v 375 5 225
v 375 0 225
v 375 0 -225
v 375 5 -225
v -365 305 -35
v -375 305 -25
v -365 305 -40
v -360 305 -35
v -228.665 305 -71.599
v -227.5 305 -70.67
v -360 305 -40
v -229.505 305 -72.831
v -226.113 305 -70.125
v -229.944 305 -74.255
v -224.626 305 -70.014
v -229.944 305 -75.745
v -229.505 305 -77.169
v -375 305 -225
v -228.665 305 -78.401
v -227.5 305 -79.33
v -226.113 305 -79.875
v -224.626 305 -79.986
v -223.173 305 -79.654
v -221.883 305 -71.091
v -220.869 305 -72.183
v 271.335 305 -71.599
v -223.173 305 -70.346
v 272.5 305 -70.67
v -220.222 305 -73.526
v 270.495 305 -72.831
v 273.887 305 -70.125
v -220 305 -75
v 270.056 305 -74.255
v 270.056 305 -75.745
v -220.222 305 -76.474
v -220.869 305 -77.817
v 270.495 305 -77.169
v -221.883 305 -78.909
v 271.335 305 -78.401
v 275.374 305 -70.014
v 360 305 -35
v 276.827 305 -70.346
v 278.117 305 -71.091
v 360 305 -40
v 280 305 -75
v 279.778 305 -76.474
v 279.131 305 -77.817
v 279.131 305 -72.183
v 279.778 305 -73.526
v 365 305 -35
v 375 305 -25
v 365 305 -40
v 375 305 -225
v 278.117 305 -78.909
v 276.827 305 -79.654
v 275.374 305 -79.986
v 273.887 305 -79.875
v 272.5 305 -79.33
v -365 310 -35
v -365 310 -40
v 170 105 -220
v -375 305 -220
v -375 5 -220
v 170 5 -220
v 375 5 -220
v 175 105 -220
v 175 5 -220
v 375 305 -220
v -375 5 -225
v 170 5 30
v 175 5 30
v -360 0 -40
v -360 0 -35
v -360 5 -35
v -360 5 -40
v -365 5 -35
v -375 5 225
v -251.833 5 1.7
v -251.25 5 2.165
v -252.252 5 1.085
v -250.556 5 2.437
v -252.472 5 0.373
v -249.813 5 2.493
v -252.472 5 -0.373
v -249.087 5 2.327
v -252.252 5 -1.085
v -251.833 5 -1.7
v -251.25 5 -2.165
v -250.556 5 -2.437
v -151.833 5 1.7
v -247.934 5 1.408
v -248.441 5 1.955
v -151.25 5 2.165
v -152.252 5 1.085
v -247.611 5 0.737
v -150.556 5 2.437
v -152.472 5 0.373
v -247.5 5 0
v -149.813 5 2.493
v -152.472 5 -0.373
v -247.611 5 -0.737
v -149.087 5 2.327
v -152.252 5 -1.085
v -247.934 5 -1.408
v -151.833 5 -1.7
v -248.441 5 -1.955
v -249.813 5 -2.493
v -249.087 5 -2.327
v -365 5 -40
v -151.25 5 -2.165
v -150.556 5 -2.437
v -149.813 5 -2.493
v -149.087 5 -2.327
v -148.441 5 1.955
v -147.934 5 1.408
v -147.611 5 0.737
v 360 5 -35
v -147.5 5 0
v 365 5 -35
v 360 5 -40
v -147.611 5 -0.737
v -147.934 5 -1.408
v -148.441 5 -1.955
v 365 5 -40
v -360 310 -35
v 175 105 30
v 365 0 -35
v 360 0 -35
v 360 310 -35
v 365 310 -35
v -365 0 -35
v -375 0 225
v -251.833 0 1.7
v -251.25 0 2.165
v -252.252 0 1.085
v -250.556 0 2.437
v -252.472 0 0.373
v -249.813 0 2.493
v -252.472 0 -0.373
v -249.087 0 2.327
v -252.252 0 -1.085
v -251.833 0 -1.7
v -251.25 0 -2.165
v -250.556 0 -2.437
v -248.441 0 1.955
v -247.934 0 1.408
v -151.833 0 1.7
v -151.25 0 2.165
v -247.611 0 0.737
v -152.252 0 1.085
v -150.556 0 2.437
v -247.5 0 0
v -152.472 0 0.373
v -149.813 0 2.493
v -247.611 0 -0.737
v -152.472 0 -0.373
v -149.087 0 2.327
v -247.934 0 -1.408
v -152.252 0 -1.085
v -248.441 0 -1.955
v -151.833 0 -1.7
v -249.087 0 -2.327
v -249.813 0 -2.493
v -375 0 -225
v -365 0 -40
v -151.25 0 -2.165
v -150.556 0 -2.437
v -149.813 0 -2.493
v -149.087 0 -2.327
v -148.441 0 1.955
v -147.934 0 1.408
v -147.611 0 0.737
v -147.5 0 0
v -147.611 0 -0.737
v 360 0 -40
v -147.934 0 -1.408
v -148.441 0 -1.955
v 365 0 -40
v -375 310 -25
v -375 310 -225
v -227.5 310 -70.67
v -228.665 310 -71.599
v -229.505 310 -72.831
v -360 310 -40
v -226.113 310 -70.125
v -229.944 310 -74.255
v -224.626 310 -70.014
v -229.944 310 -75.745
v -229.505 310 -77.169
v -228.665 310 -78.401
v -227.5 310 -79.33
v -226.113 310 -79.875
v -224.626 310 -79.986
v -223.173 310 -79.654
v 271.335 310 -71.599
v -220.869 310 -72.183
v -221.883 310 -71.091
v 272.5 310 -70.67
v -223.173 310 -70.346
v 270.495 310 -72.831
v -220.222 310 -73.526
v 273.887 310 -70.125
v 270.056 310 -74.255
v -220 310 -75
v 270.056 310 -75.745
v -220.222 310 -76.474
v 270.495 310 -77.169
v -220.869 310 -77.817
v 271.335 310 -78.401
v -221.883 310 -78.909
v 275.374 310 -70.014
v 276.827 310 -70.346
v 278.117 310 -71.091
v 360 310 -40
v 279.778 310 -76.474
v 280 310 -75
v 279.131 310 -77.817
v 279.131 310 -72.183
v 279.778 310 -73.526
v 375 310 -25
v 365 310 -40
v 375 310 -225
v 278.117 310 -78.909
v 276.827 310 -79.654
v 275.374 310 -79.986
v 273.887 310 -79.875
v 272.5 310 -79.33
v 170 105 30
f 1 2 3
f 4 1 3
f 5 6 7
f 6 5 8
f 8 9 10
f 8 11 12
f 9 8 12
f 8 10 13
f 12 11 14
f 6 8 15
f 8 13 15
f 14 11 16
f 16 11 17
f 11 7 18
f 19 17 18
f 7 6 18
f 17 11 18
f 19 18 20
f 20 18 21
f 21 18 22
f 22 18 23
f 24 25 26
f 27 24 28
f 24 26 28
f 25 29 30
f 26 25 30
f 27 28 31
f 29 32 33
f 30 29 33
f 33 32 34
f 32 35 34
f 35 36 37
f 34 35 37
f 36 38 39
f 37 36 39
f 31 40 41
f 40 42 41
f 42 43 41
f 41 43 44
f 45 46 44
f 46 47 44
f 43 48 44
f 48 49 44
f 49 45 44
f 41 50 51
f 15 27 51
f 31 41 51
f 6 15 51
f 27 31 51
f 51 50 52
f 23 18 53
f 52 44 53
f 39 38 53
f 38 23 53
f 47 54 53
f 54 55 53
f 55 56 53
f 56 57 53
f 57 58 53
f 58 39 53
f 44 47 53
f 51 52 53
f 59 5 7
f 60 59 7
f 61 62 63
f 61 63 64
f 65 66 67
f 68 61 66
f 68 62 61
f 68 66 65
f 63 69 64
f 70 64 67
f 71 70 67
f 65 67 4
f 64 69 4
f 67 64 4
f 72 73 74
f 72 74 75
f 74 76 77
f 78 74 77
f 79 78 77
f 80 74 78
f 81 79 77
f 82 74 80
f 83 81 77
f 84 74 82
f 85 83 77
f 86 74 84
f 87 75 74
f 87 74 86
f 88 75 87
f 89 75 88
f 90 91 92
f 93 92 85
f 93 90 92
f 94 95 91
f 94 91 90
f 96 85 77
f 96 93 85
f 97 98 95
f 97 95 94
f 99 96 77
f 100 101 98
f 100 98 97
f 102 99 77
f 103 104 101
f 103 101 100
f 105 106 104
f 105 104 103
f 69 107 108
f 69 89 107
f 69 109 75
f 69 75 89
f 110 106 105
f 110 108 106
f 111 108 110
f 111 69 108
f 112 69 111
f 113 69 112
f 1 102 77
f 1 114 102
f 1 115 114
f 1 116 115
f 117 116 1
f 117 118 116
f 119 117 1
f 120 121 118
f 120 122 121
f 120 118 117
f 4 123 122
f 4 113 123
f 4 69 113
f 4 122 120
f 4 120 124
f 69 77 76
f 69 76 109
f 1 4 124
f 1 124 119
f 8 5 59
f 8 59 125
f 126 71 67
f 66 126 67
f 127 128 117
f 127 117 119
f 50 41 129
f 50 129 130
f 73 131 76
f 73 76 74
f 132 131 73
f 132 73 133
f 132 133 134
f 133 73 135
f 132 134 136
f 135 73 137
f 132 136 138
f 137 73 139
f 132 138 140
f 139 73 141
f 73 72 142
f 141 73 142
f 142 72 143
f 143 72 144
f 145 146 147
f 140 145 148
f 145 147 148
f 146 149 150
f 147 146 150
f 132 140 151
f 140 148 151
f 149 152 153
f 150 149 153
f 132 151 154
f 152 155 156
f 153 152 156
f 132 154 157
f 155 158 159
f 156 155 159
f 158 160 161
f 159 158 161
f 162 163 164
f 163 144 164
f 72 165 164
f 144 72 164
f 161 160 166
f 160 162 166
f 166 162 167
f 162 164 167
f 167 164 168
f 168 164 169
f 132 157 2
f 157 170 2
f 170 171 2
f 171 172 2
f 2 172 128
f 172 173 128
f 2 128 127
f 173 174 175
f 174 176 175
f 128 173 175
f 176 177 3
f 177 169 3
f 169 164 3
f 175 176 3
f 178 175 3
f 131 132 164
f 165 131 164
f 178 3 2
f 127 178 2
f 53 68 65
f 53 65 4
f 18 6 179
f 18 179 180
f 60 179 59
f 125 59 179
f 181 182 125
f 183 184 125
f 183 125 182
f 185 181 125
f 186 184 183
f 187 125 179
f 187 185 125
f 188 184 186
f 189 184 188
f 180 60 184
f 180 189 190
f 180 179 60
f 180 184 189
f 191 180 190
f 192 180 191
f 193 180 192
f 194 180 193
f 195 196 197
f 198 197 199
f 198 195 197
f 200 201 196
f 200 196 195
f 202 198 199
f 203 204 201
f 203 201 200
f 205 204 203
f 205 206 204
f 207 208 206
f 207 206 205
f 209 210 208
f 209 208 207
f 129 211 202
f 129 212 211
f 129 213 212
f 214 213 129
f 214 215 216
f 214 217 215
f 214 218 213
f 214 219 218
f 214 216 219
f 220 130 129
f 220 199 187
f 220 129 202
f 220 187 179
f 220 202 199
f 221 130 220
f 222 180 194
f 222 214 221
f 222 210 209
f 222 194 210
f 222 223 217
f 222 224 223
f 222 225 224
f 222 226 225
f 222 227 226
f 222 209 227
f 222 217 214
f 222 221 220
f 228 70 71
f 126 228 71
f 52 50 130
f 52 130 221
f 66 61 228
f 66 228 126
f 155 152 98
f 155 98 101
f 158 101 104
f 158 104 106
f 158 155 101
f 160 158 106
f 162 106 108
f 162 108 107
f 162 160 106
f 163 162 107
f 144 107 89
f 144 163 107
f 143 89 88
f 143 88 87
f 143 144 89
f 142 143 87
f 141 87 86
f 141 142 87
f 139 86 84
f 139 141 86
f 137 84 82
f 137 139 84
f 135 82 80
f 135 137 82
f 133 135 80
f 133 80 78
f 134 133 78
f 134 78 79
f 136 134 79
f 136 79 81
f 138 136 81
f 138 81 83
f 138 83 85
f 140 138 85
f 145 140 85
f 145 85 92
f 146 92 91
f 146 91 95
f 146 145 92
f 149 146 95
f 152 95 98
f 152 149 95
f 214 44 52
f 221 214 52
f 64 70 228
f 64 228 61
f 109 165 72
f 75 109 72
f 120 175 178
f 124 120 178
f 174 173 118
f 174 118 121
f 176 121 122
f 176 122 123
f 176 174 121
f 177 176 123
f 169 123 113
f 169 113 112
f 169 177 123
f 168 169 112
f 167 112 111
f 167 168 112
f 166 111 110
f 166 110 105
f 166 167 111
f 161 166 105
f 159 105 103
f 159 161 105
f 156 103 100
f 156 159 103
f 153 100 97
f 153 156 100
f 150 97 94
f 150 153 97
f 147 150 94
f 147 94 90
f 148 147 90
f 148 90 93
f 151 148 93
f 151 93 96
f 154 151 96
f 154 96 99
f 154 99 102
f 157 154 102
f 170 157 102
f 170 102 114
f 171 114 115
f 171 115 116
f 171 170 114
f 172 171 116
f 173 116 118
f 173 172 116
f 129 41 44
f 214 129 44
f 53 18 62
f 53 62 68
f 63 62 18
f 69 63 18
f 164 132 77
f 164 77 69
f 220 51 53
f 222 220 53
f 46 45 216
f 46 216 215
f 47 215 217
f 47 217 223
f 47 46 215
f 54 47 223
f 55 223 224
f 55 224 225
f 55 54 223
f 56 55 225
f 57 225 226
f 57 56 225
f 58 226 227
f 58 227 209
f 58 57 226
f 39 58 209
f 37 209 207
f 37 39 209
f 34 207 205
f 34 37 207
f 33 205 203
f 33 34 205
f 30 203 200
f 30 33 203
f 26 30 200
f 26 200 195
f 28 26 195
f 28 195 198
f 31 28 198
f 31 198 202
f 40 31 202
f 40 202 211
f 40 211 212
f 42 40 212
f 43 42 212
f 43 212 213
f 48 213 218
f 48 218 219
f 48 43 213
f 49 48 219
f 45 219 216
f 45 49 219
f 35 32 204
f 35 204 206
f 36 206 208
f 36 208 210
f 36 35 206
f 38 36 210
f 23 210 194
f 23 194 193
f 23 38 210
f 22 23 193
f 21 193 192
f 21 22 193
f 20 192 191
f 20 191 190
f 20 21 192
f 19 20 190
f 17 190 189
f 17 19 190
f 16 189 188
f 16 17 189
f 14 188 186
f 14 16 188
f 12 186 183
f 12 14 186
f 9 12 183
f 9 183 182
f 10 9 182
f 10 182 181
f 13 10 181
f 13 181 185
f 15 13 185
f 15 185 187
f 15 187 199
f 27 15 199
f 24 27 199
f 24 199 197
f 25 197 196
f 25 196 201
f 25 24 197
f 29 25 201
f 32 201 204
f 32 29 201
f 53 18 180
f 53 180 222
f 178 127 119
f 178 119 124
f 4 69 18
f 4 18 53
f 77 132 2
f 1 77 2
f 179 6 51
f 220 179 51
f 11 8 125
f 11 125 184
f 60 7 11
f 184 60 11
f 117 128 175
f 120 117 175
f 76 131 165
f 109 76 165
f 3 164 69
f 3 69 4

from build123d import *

# Parameters (mm, degrees)
SKETCH1_W               = 750
SKETCH1_H               = 450
BOSS_EXTRUDE1_DEPTH     = 310
SKETCH8_W               = 750
SKETCH8_H               = 300
CUT_EXTRUDE1_DEPTH      = 445
SKETCH15_W              = 5
SKETCH15_H              = 250
BOSS_EXTRUDE8_DEPTH     = 100
CUT_EXTRUDE2_DEPTH      = 537.050370768
CUT_EXTRUDE2_DEPTH_BACK = 10
SKETCH16_R              = 5
SKETCH16_W              = 750
SKETCH16_H              = 250
SKETCH18_W              = 5
SKETCH18_H              = 5
CUT_EXTRUDE3_DEPTH      = 537.050370768
SKETCH10_R              = 2.5
CUT_EXTRUDE4_DEPTH      = 534.174455502
SPLIT1_START            = 305
SPLIT1_OUTLINE_W        = 750
SPLIT1_OUTLINE_H        = 200
SPLIT1_OUTLINE_W_2      = 5
SPLIT1_OUTLINE_H_2      = 5
SPLIT1_OUTLINE_R        = 5
SPLIT1_DEPTH            = 5
SPLIT1_2_OUTLINE_W      = 750
SPLIT1_2_OUTLINE_H      = 450
SPLIT1_2_OUTLINE_W_2    = 5
SPLIT1_2_OUTLINE_H_2    = 5
SPLIT1_2_OUTLINE_R      = 2.5
SPLIT1_2_DEPTH          = 5
SPLIT1_3_OUTLINE_W      = 750
SPLIT1_3_OUTLINE_H      = 200
SPLIT1_3_OUTLINE_W_2    = 5
SPLIT1_3_OUTLINE_H_2    = 5
SPLIT1_3_OUTLINE_R      = 5
SPLIT1_3_DEPTH          = 5
SPLIT1_4_OUTLINE_W      = 750
SPLIT1_4_OUTLINE_H      = 450
SPLIT1_4_OUTLINE_W_2    = 5
SPLIT1_4_OUTLINE_H_2    = 5
SPLIT1_4_OUTLINE_R      = 2.5
SPLIT1_4_DEPTH          = 5


# Read off the part's stored shape, not the designer's step: Split1
with BuildPart() as part:
    # Sketch1 → Boss-Extrude1 (new body)
    with BuildSketch(Plane(origin=(0, 0, 0), x_dir=(1, 0, 0), z_dir=(0, 1, 0))):
        Rectangle(SKETCH1_W, SKETCH1_H)
    extrude(amount=BOSS_EXTRUDE1_DEPTH)

    # Sketch8 → Cut-Extrude1 (cut)
    with BuildSketch(Plane.XY.offset(225)):
        with Locations((0, 155)):
            Rectangle(SKETCH8_W, SKETCH8_H)
    extrude(amount=-CUT_EXTRUDE1_DEPTH, mode=Mode.SUBTRACT)

    # Sketch15 → Boss-Extrude8 (add)
    with BuildSketch(Plane(origin=(0, 5, 0), x_dir=(1, 0, 0), z_dir=(0, 1, 0))):
        with Locations((172.5, 95)):
            Rectangle(SKETCH15_W, SKETCH15_H)
    extrude(amount=BOSS_EXTRUDE8_DEPTH)

    # Sketch16 → Cut-Extrude2 (cut, two sides: drawn at the far end of the back side and taken through both)
    with BuildSketch(Plane(origin=(0, 310, 0), x_dir=(1, 0, 0), z_dir=(0, 1, 0)).offset(-CUT_EXTRUDE2_DEPTH_BACK)):
        with Locations(Location((275, 75, 0), (0, 0, 90))):
            Circle(SKETCH16_R)
        with Locations(Location((-225, 75, 0), (0, 0, 90))):
            Circle(SKETCH16_R)
        with Locations((0, -100)):
            Rectangle(SKETCH16_W, SKETCH16_H)
    extrude(amount=CUT_EXTRUDE2_DEPTH + CUT_EXTRUDE2_DEPTH_BACK, mode=Mode.SUBTRACT)

    # Sketch18 → Cut-Extrude3 (cut, through all)
    with BuildSketch(Plane(origin=(0, 310, 0), x_dir=(1, 0, 0), z_dir=(0, 1, 0))):
        with Locations((-362.5, 37.5)):
            Rectangle(SKETCH18_W, SKETCH18_H)
        with Locations((362.5, 37.5)):
            Rectangle(SKETCH18_W, SKETCH18_H)
    extrude(amount=-CUT_EXTRUDE3_DEPTH, mode=Mode.SUBTRACT)

    # Sketch10 → Cut-Extrude4 (cut, through all)
    with BuildSketch(Plane(origin=(0, 5, 0), x_dir=(1, 0, 0), z_dir=(0, 1, 0))):
        with Locations(Location((-250, 0, 0), (0, 0, 270))):
            Circle(SKETCH10_R)
        with Locations(Location((-150, 0, 0), (0, 0, 270))):
            Circle(SKETCH10_R)
    extrude(amount=-CUT_EXTRUDE4_DEPTH, mode=Mode.SUBTRACT)

    # Split1 2 outline → Split1 2 (cut)
    with BuildSketch(Plane(origin=(0, 0, 0), x_dir=(1, 0, 0), z_dir=(0, 1, 0))):
        Rectangle(SPLIT1_2_OUTLINE_W, SPLIT1_2_OUTLINE_H)
        with Locations((-362.5, 37.5)):
            Rectangle(SPLIT1_2_OUTLINE_W_2, SPLIT1_2_OUTLINE_H_2, mode=Mode.SUBTRACT)
        with Locations((362.5, 37.5)):
            Rectangle(SPLIT1_2_OUTLINE_W_2, SPLIT1_2_OUTLINE_H_2, mode=Mode.SUBTRACT)
        with Locations((-150, 0)):
            Circle(SPLIT1_2_OUTLINE_R, mode=Mode.SUBTRACT)
        with Locations((-250, 0)):
            Circle(SPLIT1_2_OUTLINE_R, mode=Mode.SUBTRACT)
    extrude(amount=SPLIT1_2_DEPTH, mode=Mode.SUBTRACT)

    # Split1 3 outline → Split1 3 (cut)
    with BuildSketch(Plane(origin=(0, 0, 0), x_dir=(1, 0, 0), z_dir=(0, 1, 0)).offset(SPLIT1_START)):
        with Locations((0, 125)):
            Rectangle(SPLIT1_3_OUTLINE_W, SPLIT1_3_OUTLINE_H)
        with Locations((-362.5, 37.5)):
            Rectangle(SPLIT1_3_OUTLINE_W_2, SPLIT1_3_OUTLINE_H_2, mode=Mode.SUBTRACT)
        with Locations((-225, 75)):
            Circle(SPLIT1_3_OUTLINE_R, mode=Mode.SUBTRACT)
        with Locations((362.5, 37.5)):
            Rectangle(SPLIT1_3_OUTLINE_W_2, SPLIT1_3_OUTLINE_H_2, mode=Mode.SUBTRACT)
        with Locations((275, 75)):
            Circle(SPLIT1_3_OUTLINE_R, mode=Mode.SUBTRACT)
    extrude(amount=SPLIT1_3_DEPTH, mode=Mode.SUBTRACT)


with BuildPart() as body_2:
    # Split1 outline → Split1 (new body)
    with BuildSketch(Plane(origin=(0, 0, 0), x_dir=(1, 0, 0), z_dir=(0, 1, 0)).offset(SPLIT1_START)):
        with Locations((0, 125)):
            Rectangle(SPLIT1_OUTLINE_W, SPLIT1_OUTLINE_H)
        with Locations((-362.5, 37.5)):
            Rectangle(SPLIT1_OUTLINE_W_2, SPLIT1_OUTLINE_H_2, mode=Mode.SUBTRACT)
        with Locations((-225, 75)):
            Circle(SPLIT1_OUTLINE_R, mode=Mode.SUBTRACT)
        with Locations((362.5, 37.5)):
            Rectangle(SPLIT1_OUTLINE_W_2, SPLIT1_OUTLINE_H_2, mode=Mode.SUBTRACT)
        with Locations((275, 75)):
            Circle(SPLIT1_OUTLINE_R, mode=Mode.SUBTRACT)
    extrude(amount=SPLIT1_DEPTH)


with BuildPart() as body_3:
    # Split1 4 outline → Split1 4 (new body)
    with BuildSketch(Plane(origin=(0, 0, 0), x_dir=(1, 0, 0), z_dir=(0, 1, 0))):
        Rectangle(SPLIT1_4_OUTLINE_W, SPLIT1_4_OUTLINE_H)
        with Locations((-362.5, 37.5)):
            Rectangle(SPLIT1_4_OUTLINE_W_2, SPLIT1_4_OUTLINE_H_2, mode=Mode.SUBTRACT)
        with Locations((-250, 0)):
            Circle(SPLIT1_4_OUTLINE_R, mode=Mode.SUBTRACT)
        with Locations((-150, 0)):
            Circle(SPLIT1_4_OUTLINE_R, mode=Mode.SUBTRACT)
        with Locations((362.5, 37.5)):
            Rectangle(SPLIT1_4_OUTLINE_W_2, SPLIT1_4_OUTLINE_H_2, mode=Mode.SUBTRACT)
    extrude(amount=SPLIT1_4_DEPTH)


solid = Compound([part.part, body_2.part, body_3.part])
